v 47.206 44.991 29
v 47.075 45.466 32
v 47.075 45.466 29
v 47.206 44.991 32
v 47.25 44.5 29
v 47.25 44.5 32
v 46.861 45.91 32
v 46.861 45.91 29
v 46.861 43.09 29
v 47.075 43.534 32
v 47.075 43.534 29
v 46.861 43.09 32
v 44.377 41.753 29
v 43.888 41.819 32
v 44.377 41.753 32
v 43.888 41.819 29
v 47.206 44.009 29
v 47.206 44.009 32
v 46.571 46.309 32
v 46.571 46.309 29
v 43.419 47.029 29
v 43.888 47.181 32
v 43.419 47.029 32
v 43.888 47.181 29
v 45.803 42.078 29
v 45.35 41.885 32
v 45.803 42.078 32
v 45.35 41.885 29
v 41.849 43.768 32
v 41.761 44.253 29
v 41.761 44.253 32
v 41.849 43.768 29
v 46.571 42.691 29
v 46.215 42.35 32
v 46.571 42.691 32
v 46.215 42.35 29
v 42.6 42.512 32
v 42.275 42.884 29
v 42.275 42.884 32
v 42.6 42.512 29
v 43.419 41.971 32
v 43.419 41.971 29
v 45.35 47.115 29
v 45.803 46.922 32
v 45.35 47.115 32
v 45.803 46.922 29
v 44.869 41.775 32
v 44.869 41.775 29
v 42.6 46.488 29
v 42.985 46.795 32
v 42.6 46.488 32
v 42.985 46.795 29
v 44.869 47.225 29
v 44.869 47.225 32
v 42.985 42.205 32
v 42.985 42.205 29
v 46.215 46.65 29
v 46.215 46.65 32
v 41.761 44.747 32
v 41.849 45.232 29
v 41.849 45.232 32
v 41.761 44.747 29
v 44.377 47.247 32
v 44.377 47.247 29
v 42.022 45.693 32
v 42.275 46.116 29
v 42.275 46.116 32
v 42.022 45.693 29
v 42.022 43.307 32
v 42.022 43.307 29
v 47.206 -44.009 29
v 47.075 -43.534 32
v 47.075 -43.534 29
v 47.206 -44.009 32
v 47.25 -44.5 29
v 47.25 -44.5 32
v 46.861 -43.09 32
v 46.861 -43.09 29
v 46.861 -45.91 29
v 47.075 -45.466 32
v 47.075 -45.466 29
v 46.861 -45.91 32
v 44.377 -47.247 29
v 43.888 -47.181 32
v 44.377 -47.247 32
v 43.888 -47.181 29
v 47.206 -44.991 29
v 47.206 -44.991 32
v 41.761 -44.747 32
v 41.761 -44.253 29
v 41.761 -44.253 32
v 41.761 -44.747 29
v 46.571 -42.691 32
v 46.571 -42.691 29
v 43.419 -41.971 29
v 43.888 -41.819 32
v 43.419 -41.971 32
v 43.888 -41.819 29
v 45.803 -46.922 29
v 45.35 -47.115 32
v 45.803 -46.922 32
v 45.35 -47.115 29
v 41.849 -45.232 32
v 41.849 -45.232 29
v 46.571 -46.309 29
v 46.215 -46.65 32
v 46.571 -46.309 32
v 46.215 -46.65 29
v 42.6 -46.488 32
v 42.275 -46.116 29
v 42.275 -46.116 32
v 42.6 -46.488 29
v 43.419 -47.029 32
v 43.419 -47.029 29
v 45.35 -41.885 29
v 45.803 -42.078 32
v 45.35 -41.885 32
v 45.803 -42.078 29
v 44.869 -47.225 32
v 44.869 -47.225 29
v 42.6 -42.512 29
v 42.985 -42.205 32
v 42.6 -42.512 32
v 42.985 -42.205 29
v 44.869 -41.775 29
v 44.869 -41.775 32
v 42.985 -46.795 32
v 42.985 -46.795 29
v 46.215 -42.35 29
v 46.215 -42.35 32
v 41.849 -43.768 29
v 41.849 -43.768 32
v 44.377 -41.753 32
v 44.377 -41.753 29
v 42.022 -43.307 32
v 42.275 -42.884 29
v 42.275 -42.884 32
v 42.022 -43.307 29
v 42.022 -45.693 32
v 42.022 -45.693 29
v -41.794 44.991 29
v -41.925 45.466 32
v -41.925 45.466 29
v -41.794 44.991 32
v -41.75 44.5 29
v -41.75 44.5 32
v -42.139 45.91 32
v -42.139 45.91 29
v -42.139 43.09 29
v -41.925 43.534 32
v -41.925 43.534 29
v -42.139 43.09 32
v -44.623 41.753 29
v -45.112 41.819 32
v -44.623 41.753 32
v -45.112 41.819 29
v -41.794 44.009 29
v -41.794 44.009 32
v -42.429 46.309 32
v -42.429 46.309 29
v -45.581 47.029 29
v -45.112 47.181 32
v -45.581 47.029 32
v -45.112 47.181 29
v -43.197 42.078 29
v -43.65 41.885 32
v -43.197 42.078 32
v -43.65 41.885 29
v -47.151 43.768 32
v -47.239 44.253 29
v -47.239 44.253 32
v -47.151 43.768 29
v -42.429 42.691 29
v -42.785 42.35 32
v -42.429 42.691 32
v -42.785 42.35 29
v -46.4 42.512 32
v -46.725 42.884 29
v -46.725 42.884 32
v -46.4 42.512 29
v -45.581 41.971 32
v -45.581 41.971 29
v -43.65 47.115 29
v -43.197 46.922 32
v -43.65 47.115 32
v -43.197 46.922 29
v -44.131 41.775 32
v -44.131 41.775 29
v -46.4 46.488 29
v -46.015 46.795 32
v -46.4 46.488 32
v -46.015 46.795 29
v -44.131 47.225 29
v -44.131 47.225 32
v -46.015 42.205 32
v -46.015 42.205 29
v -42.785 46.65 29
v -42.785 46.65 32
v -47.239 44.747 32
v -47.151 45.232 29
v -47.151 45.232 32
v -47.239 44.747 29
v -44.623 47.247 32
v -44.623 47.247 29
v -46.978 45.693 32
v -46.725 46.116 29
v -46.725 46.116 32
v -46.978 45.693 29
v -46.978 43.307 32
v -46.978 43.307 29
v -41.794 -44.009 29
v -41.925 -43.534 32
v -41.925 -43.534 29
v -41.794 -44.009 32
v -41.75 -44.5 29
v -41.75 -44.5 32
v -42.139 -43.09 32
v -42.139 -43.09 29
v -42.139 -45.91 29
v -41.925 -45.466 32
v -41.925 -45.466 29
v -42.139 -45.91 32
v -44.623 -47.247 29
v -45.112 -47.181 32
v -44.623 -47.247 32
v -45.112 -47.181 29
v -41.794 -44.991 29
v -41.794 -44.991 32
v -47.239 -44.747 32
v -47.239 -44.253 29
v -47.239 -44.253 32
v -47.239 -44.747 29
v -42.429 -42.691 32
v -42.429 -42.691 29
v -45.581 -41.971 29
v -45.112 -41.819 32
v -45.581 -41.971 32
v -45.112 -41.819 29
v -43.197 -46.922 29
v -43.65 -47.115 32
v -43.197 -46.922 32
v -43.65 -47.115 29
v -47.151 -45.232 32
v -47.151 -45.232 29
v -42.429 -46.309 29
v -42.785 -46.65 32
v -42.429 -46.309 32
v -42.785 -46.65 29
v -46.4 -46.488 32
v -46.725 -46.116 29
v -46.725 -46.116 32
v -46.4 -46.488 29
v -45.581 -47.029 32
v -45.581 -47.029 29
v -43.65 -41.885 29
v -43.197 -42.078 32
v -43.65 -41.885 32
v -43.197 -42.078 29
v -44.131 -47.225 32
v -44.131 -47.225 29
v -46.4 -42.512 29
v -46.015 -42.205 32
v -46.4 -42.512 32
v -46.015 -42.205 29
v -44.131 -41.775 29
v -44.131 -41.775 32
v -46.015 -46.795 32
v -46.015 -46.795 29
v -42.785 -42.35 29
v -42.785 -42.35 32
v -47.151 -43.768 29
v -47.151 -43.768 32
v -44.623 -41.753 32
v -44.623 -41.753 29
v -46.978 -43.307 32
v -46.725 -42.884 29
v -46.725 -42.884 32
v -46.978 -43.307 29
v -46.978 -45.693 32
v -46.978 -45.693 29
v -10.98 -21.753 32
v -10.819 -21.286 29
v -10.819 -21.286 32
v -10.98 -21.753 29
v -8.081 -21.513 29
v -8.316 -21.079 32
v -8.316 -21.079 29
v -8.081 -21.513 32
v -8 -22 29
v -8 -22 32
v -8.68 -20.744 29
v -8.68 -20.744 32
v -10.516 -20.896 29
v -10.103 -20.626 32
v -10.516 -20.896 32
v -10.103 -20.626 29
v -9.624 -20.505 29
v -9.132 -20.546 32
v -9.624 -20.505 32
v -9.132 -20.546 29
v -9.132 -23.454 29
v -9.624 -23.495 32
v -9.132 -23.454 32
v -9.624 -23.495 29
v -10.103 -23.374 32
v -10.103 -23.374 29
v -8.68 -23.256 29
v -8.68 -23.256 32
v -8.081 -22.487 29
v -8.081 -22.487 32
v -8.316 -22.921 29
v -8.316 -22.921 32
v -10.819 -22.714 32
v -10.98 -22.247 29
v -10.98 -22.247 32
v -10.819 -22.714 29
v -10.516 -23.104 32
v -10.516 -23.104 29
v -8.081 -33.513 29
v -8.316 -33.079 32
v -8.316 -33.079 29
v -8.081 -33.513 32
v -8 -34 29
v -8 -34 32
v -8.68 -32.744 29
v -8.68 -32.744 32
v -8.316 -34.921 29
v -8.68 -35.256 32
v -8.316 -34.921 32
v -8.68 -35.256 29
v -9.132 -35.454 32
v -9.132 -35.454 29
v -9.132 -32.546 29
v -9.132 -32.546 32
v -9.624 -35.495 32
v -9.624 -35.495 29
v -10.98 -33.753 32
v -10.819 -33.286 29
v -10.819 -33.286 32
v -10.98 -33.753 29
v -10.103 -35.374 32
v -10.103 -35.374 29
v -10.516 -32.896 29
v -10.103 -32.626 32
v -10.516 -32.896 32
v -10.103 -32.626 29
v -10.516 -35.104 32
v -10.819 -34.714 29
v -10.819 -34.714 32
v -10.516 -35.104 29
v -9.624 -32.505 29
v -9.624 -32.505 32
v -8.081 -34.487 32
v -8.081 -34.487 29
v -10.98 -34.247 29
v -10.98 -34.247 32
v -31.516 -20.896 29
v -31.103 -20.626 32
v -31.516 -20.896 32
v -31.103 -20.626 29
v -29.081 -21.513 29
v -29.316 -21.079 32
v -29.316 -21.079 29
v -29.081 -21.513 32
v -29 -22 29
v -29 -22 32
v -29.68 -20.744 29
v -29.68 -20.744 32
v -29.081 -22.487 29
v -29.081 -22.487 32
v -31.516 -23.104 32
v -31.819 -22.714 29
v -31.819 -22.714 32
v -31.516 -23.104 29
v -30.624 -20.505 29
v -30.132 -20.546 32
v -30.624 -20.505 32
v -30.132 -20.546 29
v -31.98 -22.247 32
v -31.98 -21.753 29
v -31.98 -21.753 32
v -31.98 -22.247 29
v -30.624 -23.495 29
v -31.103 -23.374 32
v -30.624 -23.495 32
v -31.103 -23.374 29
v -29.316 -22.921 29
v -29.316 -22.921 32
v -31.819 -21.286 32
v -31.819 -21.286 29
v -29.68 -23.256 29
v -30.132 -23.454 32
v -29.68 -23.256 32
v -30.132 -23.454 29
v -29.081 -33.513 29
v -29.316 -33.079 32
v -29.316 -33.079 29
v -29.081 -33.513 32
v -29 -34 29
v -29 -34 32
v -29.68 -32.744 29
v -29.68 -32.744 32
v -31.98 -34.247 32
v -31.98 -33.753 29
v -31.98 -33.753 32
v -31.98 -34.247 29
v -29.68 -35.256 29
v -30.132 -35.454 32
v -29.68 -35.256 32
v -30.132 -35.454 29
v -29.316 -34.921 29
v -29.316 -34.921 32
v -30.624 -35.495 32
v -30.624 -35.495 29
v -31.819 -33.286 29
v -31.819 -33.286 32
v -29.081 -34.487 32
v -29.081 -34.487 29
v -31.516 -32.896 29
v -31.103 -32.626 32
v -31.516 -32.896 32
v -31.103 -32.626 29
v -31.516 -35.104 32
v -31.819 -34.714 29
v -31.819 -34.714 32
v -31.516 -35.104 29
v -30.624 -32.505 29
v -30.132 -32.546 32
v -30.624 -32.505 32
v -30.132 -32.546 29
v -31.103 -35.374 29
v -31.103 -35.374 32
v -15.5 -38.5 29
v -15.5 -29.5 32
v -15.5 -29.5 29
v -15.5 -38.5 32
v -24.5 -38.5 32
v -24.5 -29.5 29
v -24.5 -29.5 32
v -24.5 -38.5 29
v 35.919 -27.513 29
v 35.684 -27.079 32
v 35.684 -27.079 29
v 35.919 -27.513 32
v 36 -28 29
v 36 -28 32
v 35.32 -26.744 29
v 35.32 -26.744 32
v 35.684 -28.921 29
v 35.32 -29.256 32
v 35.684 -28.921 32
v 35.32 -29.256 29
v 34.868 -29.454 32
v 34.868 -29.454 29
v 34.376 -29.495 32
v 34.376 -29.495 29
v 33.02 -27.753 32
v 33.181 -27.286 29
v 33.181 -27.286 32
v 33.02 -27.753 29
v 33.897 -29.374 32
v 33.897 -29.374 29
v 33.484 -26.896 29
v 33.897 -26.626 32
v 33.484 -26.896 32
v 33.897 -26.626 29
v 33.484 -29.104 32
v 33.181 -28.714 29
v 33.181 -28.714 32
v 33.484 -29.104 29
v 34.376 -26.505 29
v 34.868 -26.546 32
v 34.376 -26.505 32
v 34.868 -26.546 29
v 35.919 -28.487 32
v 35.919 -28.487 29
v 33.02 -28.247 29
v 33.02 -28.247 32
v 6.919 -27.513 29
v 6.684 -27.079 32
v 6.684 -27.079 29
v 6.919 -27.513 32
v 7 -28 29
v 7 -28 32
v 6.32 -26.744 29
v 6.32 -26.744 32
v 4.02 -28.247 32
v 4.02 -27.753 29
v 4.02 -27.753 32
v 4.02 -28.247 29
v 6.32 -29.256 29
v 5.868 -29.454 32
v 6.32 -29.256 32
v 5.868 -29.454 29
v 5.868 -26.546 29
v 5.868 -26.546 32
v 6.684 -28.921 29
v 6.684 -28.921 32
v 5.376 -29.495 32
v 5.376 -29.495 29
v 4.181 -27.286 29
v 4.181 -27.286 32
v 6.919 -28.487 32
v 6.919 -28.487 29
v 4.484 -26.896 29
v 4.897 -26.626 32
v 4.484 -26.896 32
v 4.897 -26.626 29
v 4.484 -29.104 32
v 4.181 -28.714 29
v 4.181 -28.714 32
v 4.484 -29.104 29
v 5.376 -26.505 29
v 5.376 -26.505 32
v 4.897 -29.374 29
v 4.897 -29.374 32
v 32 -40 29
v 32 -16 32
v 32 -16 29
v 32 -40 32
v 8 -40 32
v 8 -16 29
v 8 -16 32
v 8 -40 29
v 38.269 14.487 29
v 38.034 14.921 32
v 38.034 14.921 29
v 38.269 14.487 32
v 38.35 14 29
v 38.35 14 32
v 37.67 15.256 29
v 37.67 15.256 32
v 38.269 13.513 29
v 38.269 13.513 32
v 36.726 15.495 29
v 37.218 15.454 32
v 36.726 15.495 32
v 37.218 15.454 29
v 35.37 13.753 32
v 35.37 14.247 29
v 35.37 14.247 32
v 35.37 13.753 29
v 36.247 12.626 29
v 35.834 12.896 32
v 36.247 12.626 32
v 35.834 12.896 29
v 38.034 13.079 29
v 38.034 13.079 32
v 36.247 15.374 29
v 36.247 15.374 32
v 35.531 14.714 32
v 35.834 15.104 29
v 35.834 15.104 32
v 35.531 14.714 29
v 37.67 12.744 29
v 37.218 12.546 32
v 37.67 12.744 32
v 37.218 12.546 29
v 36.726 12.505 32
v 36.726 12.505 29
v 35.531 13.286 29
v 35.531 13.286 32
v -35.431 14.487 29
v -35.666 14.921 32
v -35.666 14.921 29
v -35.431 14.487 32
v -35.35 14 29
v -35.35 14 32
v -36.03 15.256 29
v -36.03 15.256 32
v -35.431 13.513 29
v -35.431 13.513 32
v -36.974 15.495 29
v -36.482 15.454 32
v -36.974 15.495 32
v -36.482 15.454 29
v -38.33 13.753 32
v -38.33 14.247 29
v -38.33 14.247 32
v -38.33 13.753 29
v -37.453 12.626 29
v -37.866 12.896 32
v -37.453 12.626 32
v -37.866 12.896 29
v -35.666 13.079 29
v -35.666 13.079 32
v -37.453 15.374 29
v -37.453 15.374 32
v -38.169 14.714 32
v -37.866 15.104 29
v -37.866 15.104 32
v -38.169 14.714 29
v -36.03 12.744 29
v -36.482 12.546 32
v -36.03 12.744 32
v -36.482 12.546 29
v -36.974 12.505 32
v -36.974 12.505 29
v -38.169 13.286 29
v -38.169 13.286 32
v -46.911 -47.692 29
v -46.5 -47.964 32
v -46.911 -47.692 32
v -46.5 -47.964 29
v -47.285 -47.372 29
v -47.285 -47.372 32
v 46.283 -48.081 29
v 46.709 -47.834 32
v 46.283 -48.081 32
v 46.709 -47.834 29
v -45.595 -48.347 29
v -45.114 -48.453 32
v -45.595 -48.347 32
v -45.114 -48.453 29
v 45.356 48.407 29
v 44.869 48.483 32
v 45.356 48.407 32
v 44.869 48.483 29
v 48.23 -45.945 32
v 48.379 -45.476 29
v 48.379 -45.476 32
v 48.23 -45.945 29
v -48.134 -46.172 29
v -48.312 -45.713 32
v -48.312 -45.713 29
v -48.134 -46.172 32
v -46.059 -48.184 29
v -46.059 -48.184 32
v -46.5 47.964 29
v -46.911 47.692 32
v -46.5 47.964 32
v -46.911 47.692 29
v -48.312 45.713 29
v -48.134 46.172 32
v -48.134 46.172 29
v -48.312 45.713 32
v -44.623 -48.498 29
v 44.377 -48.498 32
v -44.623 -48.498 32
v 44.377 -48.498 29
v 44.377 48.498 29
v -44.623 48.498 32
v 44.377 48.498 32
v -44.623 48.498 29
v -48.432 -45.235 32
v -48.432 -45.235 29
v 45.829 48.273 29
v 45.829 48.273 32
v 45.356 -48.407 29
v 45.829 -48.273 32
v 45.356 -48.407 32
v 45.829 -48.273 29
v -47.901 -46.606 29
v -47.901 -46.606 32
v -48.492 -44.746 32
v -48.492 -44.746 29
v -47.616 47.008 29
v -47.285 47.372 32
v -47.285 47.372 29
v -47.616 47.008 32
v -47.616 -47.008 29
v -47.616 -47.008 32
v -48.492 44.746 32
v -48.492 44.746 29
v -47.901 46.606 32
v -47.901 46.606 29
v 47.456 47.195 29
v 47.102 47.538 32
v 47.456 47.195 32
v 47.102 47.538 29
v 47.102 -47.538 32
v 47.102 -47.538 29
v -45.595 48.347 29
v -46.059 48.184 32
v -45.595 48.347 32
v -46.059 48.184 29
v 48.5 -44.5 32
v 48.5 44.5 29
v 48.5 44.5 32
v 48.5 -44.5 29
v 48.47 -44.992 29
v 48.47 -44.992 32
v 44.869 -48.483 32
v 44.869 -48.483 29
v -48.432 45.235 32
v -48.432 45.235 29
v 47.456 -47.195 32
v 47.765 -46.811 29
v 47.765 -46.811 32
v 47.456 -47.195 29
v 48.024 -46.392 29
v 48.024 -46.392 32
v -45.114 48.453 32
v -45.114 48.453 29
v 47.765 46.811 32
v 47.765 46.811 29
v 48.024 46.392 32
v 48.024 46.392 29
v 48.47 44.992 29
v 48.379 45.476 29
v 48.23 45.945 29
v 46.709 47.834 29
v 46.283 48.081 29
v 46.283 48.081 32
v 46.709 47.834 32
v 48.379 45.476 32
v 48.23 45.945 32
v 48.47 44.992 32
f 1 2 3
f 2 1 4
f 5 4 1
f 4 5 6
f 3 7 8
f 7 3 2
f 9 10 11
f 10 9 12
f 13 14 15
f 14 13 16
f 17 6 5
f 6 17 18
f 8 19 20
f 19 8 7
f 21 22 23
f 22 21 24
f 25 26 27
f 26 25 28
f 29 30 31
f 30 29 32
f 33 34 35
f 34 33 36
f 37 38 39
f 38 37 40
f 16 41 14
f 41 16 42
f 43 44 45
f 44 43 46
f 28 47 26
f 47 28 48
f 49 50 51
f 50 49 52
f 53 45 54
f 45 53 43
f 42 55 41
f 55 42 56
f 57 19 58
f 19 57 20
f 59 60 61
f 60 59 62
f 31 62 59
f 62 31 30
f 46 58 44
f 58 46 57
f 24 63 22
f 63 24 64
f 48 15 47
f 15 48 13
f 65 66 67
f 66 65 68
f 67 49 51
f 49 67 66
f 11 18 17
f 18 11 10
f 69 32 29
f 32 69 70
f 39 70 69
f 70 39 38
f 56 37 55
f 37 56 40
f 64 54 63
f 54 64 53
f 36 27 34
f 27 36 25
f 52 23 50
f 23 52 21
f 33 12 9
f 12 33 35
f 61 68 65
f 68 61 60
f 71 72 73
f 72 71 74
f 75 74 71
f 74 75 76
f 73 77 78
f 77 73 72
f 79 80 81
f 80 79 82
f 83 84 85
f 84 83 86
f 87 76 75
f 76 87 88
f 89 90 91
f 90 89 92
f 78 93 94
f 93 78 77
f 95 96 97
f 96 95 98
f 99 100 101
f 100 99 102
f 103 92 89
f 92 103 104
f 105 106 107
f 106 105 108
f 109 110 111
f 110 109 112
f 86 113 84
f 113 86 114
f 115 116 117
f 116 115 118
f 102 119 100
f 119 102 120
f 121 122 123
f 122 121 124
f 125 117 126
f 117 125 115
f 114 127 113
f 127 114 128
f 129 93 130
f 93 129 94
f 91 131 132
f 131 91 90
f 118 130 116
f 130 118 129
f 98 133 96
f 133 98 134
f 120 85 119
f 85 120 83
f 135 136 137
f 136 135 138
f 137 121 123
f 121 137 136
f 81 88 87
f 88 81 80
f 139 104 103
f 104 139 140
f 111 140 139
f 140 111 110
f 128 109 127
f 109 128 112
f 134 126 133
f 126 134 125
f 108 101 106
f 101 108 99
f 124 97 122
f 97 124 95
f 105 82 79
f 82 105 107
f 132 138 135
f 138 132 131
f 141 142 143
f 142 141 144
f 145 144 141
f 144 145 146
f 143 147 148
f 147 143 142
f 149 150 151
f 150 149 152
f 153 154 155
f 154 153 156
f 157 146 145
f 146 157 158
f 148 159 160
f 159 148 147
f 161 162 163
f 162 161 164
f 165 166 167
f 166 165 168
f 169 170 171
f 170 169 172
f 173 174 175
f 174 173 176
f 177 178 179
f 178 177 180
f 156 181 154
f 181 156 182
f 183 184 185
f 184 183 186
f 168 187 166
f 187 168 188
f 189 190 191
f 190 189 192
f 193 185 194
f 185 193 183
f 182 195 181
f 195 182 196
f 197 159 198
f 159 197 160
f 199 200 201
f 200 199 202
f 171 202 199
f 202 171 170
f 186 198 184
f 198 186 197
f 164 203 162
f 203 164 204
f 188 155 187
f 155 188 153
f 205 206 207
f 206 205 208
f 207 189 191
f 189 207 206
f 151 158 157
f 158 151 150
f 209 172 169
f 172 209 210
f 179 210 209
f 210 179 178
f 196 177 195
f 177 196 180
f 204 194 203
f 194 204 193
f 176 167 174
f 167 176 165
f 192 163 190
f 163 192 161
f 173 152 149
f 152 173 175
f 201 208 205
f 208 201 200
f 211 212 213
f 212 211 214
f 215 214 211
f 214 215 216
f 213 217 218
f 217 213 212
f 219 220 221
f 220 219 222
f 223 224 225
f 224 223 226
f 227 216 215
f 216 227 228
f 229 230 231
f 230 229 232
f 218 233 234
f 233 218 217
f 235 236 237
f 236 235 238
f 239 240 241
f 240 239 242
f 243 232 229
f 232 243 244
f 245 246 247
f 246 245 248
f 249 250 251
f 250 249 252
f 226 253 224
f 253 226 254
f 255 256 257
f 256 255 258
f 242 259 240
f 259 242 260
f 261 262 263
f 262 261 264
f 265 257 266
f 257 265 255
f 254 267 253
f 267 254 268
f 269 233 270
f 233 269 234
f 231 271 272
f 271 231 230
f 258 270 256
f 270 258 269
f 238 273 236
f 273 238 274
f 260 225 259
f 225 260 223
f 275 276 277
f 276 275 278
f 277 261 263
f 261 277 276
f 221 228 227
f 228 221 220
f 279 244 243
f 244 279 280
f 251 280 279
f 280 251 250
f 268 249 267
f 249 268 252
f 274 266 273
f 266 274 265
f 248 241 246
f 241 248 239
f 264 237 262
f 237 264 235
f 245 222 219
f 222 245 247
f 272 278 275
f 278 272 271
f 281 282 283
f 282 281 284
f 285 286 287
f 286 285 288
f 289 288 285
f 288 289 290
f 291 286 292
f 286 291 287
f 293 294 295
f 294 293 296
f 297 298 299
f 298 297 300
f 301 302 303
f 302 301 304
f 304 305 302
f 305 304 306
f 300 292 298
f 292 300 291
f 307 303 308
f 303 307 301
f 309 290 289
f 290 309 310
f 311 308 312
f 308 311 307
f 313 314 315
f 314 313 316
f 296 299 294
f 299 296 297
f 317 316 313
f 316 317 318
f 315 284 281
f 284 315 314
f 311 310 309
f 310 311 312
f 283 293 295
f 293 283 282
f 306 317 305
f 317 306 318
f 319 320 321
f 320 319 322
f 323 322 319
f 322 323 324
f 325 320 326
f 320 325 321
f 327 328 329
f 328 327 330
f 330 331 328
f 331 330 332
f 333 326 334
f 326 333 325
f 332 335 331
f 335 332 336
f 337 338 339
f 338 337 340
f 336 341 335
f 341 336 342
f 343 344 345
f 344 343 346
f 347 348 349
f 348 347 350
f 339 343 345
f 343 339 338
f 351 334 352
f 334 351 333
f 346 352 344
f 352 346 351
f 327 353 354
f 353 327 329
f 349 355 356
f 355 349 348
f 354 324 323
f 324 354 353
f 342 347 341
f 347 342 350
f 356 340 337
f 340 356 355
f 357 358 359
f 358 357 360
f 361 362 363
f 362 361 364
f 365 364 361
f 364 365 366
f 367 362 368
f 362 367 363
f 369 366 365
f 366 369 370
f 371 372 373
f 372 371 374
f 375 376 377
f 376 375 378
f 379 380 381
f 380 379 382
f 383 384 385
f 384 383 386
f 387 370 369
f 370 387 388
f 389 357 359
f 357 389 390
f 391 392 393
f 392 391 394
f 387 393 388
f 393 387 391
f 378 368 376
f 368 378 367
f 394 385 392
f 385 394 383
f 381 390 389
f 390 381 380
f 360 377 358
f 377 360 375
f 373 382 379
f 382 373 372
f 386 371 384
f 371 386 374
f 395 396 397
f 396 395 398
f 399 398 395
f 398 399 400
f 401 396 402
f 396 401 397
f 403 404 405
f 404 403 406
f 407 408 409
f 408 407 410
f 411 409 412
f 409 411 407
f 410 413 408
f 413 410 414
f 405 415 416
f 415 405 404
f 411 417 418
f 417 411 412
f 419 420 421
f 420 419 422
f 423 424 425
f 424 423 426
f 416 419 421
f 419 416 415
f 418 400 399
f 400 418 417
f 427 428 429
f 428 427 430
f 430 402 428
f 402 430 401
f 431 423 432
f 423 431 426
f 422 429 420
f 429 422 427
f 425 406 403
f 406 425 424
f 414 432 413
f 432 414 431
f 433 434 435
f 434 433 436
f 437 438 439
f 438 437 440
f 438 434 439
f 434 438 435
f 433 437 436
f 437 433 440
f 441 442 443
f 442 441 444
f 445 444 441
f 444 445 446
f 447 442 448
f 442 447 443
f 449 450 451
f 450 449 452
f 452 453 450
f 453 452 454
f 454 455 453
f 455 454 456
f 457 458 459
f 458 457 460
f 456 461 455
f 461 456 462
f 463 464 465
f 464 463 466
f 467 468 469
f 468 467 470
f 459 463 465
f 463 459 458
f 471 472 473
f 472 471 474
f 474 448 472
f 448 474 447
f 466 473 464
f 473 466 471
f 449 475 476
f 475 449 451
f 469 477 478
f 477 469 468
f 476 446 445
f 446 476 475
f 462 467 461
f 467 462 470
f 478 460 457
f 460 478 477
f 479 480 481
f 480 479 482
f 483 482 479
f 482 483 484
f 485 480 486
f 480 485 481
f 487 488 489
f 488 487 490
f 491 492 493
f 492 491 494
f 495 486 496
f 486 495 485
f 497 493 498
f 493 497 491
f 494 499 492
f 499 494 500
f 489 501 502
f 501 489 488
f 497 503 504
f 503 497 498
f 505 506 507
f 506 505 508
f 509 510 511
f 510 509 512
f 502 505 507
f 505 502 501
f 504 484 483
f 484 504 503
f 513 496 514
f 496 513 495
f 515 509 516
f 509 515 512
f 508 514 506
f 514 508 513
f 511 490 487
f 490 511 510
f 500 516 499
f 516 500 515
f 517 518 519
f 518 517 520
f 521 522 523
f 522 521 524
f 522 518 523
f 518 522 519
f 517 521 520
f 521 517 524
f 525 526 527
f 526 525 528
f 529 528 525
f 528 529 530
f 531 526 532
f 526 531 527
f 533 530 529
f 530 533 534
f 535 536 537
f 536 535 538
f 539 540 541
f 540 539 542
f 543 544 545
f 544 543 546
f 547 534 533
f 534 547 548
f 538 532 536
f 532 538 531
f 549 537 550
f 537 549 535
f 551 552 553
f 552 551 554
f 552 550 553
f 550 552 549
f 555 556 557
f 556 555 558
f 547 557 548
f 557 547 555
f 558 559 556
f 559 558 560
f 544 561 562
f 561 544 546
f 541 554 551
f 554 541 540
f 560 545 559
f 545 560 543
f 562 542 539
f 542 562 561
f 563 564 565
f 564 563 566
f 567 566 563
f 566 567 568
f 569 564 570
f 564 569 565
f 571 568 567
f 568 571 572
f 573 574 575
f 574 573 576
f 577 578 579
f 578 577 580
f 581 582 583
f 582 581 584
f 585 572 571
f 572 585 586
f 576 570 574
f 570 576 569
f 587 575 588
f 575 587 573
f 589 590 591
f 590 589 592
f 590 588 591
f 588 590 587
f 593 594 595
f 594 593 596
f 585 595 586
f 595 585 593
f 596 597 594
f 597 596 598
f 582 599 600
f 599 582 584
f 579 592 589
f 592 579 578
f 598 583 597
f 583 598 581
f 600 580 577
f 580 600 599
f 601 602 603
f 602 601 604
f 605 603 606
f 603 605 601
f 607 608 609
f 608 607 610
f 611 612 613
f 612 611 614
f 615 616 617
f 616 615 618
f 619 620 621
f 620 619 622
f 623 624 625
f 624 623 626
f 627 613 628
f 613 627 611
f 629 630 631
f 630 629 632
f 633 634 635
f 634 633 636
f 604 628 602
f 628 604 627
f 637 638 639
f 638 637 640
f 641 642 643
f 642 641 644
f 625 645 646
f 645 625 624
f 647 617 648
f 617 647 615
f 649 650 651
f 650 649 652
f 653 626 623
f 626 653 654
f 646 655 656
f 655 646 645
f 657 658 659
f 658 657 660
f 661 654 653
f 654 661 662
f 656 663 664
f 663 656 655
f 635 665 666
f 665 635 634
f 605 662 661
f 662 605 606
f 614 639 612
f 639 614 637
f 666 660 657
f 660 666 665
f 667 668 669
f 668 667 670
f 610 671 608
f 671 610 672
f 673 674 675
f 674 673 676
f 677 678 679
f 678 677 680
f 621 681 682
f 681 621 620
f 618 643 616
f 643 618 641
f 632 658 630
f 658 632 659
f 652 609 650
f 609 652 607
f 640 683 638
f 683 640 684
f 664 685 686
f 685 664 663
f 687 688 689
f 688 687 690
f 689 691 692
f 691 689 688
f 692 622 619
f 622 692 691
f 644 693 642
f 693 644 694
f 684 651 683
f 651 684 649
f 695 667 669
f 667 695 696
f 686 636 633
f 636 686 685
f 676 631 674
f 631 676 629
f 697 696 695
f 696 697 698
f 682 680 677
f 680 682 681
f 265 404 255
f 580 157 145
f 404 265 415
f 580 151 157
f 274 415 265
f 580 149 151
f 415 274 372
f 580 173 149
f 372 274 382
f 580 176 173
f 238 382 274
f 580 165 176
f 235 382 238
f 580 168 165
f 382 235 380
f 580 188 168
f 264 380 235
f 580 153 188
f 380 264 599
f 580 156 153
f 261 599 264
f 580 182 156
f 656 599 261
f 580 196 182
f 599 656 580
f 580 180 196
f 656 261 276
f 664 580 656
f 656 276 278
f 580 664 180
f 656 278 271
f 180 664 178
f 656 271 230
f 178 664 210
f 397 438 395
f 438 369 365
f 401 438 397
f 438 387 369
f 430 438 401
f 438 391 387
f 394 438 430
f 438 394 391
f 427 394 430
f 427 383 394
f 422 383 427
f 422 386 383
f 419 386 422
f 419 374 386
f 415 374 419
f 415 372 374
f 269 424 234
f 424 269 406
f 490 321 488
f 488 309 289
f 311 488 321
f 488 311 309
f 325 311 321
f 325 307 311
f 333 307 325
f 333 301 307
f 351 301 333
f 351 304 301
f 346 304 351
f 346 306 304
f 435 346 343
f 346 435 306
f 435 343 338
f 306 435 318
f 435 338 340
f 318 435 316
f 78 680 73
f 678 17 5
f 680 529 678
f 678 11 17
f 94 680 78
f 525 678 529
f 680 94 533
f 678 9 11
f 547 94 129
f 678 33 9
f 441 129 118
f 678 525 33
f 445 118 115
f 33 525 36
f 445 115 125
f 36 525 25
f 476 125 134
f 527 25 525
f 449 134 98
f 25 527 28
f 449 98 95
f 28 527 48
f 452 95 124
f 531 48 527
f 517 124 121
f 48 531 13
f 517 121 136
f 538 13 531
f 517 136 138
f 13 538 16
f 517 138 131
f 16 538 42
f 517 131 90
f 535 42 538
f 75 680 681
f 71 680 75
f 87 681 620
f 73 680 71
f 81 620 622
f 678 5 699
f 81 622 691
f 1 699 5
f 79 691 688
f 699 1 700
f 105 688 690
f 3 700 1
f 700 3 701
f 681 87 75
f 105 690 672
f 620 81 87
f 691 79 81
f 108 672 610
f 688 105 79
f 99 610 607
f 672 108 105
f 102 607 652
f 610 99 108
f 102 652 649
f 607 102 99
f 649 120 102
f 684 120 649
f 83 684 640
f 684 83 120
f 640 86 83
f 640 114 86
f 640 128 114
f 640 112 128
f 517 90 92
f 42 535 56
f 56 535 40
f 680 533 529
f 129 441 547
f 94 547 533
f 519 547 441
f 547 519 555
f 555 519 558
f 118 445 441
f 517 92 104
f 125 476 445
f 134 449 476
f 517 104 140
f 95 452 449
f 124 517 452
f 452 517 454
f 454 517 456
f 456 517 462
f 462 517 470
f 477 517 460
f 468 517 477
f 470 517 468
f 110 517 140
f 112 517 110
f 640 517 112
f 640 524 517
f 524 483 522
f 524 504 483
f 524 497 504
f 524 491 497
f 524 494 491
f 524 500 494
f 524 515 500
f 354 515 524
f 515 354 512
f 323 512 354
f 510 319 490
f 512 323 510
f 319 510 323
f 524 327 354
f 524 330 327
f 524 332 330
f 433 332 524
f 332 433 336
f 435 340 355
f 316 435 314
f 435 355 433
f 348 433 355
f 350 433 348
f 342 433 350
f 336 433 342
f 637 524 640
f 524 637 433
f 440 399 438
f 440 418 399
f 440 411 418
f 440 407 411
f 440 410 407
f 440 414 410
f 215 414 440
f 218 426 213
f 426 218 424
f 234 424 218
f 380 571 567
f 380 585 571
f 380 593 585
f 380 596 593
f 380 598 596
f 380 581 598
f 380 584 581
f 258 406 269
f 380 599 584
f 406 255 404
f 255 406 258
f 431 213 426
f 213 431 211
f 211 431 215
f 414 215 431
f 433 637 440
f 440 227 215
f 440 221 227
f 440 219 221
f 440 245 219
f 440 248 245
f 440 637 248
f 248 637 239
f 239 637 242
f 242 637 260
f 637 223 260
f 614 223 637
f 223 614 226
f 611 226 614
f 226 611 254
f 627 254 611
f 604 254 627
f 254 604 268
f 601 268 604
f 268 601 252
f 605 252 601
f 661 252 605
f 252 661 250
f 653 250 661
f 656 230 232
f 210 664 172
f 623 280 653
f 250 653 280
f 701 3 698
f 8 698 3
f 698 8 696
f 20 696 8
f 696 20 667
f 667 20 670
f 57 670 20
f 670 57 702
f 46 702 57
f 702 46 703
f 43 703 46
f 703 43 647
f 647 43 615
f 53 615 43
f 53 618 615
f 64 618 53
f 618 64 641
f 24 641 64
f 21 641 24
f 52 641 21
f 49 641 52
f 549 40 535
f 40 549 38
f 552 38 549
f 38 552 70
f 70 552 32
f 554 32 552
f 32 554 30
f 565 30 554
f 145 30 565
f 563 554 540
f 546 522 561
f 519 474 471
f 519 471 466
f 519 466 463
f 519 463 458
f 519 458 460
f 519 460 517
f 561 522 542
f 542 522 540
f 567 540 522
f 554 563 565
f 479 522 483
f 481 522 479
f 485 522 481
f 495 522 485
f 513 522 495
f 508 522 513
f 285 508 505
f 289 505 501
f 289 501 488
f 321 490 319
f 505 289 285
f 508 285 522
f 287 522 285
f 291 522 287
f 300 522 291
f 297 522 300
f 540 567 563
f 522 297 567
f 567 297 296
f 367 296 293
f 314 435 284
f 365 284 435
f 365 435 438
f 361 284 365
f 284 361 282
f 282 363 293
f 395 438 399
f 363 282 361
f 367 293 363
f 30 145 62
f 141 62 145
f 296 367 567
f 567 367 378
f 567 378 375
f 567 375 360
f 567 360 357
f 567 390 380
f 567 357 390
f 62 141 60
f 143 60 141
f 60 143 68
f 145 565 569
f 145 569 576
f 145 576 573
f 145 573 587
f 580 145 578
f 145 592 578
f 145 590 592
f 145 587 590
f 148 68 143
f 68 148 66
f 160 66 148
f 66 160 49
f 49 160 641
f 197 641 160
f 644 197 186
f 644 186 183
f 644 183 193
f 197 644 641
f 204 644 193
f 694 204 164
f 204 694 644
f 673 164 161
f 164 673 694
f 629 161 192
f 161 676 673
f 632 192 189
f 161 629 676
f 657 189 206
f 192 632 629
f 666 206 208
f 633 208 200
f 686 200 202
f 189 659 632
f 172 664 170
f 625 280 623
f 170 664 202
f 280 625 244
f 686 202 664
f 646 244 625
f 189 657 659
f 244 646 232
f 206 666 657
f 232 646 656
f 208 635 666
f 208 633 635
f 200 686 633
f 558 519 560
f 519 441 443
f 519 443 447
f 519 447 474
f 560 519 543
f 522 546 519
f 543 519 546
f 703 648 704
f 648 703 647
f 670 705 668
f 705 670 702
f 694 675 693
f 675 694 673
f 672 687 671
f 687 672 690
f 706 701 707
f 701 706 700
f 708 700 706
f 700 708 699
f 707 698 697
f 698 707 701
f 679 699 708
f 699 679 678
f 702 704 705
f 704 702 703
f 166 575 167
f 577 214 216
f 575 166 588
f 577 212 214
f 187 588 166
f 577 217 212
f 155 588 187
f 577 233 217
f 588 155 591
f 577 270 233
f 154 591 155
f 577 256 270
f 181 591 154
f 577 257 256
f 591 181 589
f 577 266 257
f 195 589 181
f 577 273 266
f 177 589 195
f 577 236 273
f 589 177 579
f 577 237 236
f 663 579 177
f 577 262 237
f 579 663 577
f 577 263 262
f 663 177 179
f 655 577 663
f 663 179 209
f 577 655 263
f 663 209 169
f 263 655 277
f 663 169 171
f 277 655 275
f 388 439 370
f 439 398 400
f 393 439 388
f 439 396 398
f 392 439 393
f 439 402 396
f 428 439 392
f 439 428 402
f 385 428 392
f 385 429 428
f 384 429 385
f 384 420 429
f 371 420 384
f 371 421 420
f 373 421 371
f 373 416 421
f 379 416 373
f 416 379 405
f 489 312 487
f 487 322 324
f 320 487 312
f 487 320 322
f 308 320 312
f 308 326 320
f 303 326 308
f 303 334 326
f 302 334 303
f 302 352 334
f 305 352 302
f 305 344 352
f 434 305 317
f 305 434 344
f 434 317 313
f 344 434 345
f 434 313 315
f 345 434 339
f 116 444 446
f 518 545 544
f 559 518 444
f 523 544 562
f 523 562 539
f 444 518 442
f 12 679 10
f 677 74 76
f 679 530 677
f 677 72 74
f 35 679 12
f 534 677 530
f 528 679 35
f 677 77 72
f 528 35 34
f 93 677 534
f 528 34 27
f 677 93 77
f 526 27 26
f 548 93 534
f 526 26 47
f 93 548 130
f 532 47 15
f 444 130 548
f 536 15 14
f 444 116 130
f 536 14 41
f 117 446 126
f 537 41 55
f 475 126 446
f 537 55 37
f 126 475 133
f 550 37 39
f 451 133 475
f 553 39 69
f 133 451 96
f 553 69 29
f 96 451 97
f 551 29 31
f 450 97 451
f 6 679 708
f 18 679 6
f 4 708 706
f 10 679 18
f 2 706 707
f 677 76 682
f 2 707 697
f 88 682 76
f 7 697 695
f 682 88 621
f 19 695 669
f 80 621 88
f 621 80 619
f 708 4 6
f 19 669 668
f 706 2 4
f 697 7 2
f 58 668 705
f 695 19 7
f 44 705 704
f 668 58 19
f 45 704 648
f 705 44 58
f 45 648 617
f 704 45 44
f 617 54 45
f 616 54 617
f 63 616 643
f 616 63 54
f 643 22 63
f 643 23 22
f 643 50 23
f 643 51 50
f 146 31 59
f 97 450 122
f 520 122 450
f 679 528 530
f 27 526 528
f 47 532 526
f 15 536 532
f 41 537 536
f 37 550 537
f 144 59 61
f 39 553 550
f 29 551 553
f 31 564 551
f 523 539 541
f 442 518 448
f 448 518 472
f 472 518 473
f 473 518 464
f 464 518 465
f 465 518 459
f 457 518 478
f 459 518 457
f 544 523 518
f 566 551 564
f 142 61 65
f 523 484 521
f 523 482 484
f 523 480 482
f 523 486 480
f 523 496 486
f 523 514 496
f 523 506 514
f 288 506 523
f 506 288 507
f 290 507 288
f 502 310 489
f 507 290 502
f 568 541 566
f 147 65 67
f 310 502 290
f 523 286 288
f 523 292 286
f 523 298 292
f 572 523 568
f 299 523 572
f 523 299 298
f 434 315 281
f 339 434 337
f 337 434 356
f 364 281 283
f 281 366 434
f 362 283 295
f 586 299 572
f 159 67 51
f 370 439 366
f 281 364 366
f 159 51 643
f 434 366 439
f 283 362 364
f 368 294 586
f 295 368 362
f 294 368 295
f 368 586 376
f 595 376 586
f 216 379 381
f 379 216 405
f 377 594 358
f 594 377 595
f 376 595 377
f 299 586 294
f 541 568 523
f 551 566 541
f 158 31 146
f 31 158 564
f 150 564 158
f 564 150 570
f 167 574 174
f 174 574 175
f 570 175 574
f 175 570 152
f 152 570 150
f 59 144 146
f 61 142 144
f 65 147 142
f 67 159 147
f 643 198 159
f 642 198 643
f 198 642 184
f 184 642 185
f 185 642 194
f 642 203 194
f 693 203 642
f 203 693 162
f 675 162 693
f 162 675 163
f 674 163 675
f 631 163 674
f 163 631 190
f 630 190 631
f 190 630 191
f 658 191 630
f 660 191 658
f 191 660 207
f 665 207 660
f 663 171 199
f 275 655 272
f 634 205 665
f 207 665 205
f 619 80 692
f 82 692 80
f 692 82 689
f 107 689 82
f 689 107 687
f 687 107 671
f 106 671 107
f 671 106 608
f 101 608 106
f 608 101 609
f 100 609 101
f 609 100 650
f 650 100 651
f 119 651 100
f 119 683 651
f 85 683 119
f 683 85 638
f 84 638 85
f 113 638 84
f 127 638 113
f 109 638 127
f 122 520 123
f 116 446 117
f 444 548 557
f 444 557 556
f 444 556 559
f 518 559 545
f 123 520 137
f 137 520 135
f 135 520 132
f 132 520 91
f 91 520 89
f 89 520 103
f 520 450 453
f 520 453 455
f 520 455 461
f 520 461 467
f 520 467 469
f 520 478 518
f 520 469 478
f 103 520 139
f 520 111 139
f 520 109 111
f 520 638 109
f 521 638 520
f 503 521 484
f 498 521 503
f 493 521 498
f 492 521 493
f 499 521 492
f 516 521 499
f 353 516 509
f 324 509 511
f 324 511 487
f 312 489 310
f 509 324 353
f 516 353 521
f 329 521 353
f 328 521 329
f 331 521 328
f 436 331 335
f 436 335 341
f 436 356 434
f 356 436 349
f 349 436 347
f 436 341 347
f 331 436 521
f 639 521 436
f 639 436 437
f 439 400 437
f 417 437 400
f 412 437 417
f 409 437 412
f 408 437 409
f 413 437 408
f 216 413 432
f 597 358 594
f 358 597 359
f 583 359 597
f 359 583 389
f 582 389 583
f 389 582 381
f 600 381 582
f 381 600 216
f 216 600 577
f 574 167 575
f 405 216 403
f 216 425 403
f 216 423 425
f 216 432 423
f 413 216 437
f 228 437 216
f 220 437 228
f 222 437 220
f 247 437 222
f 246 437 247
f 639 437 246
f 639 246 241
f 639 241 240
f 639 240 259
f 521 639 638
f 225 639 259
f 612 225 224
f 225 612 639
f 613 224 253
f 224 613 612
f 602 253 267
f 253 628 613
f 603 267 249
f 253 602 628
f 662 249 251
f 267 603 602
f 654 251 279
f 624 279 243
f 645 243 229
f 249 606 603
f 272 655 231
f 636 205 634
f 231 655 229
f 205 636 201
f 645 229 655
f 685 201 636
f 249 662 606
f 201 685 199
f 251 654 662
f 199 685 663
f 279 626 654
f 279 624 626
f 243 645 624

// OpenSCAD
// file: rpiaplus_lib.scad
$fa=0.5;
$fs=0.5;

// RPi Dimensions: 65mm x 56mm

module corner(radius=4, height=3) {
    cylinder(r=radius, h=height, center=true);
}

module RPiMountingHole(h=20) {
    cylinder(r=1.825, h=h, center=true);
}

module baseMountingHole(h=20) {
    cylinder(r=3, h=h, center=true);
}

module baseCorners(padding=0, z=0) {
    for (x=[32.5+padding, -32.5-padding]) { 
        for (y=[32.5+padding, -32.5-padding]) { 
            translate([x, y, z])
            corner(radius=2.75, height=10);
        }
    }
}

module standoff(standoffHeight=4) {
    difference() {
        cylinder(r=2.75, h=standoffHeight, center=true);
        cylinder(r=1.825, h=standoffHeight*1.1, center=true);
    }
}

module spacer(radius=2.75, thickness=1.25, height=30) {
    difference() {
        cylinder(r=radius+thickness, height, center=true);
        cylinder(r=radius, 110, center=true);
    }
}



module enclosure(wallThickness=3,
                RPiOffsetX=-12,
                RPiOffsetY=0,
                edgePadding=12,
                printRPi=false,
                standoffHeight=4,
                spcRPiH=26,
                spcSpeakerH=18,
                spcGrillH=6,
                printGrill=false,
                totalRings=16,
                maxGrillHoleRadius=2.25) {
    
    // Base
    /*translate([0, 0, wallThickness/2])
        difference() {
            
            hull() {
                for (x=[32.5+edgePadding, -32.5-edgePadding]) { 
                    for (y=[32.5+edgePadding, -32.5-edgePadding]) { 
                        translate([x, y, 0])
                            corner(height=wallThickness);
                    }
                }
            }
            
            // holes; -3.5 from RPI edge
            translate([RPiOffsetX, RPiOffsetY, 0])
                for (x=[29.25, -29.25]) { 
                    for (y=[24.75, -24.75]) { 
                        translate([x, y, 0])
                            RPiMountingHole();
                    }
                }
            
            baseCorners(padding=edgePadding, z=0);
        };*/
        
    // Standoffs
    /*translate([RPiOffsetX, RPiOffsetY, 0])
        for (x=[29.25, -29.25]) { 
                for (y=[24.75, -24.75]) {  
                translate([x, y, standoffHeight/2 + wallThickness])
                    standoff(standoffHeight=4);
            }
        };*/

    
    // spacers; base -> speaker bottom mount
    /*for (x=[32.5+edgePadding, -32.5-edgePadding]) { 
        for (y=[32.5+edgePadding, -32.5-edgePadding]) { 
            translate([x, y, spcRPiH/2 + wallThickness])
            spacer(height=spcRPiH);
        }
    }*/
    
    difference() {
    
    // top plate
    difference() {
        
        mountZ = spcRPiH + wallThickness * 1.5;
        
        hull() {
            for (x=[32.5+edgePadding, -32.5-edgePadding]) { 
                for (y=[32.5+edgePadding, -32.5-edgePadding]) { 
                    translate([x, y, mountZ])
                        corner(height=wallThickness);
                }
            }
        }
        
        baseCorners(padding=edgePadding, z=mountZ);
        
        // camera mounts
        translate([-20, -28, 0]) {
            for (x=[10.5, -10.5]) { 
                for (y=[6, -6]) {
                    translate([x, y, mountZ])
                        cylinder(r=1.5, h=10, center=true);
                }
            }
        
            color([1, 0, 0])
                translate([0, -6, mountZ])
                    cube(9, true);
        }
        
        // motion detector mounts
        translate([20, 0, 0]) {
            for (x=[14.5, -14.5]) { 
                translate([x, -28, mountZ])
                    cylinder(r=1.5, h=10, center=true);
            }
        
            color([1, 0, 0])
                translate([0, -28, mountZ])
                    cube(24, true);
        }
        
        // lidar mounts
        for (x=[15, -15]) { 
                for (y=[10 + 4, -10 - 4]) { 
                    translate([x, y, 0])
                        cylinder(r=2, h=10, center=true);
                }
         }
         
        // proto board mounts
        for (x=[36.85, -36.85]) { 
            translate([x, 14, mountZ])
                cylinder(r=1.5, h=10, center=true);
        }
        
        // proto board (hide)
        /*translate([0, 14, mountZ])
                cube([81, 51, 100], center=true);*/
        
    }
    
    /*translate([70, 0, 0])
        cube(100, true);
    
    translate([-70, 0, 0])
        cube(100, true);
    
    translate([0, 70, 0])
        cube(100, true);*/
    }
}

enclosure(printGrill=false, totalRings= 16);

//spacer(height=41);

// screws
/*screwHeight = spcRPiH + (wallThickness * 4) + spcSpeakerH;
echo("outer screw height: ");
echo(screwHeight);
color("red")
translate([0, 0, screwHeight/2])
    cylinder(r=3, h=screwHeight, center=true);*/
// main file
include <rpiaplus_lib.scad>

/* Example 01.
 * Standard RPi enclosure.
 *
 *          wallThickness = 3; // horizontal panel thickness
 *          RPiOffsetX = 0; // RPi offset from center; -12 to make room for a wifi module
 *          RPiOffsetY = 0; // RPi offset from center
 *          edgePadding = 12; // distance bw base edge and RPi edge
 *          standoffHeight = 4; // hright of RPi standoffs
 *          printRPi = false; // set to true to print the RPi footprint
 *          spcRPiH = 26; // spacer height from base to bottom speaker panel
 *          spcSpeakerH = 18; // spacer height bw top and bottom speaker panels
 *          spcGrillH = 6; // spacer height bw top speaker panel and grill
 *          printGrill = false; // set to true to print grill
 *          totalRings = 16; // total grill pattern rings
 *          maxGrillHoleRadius = 2.25;
 */
 enclosure(printGrill=false, totalRings= 16);
